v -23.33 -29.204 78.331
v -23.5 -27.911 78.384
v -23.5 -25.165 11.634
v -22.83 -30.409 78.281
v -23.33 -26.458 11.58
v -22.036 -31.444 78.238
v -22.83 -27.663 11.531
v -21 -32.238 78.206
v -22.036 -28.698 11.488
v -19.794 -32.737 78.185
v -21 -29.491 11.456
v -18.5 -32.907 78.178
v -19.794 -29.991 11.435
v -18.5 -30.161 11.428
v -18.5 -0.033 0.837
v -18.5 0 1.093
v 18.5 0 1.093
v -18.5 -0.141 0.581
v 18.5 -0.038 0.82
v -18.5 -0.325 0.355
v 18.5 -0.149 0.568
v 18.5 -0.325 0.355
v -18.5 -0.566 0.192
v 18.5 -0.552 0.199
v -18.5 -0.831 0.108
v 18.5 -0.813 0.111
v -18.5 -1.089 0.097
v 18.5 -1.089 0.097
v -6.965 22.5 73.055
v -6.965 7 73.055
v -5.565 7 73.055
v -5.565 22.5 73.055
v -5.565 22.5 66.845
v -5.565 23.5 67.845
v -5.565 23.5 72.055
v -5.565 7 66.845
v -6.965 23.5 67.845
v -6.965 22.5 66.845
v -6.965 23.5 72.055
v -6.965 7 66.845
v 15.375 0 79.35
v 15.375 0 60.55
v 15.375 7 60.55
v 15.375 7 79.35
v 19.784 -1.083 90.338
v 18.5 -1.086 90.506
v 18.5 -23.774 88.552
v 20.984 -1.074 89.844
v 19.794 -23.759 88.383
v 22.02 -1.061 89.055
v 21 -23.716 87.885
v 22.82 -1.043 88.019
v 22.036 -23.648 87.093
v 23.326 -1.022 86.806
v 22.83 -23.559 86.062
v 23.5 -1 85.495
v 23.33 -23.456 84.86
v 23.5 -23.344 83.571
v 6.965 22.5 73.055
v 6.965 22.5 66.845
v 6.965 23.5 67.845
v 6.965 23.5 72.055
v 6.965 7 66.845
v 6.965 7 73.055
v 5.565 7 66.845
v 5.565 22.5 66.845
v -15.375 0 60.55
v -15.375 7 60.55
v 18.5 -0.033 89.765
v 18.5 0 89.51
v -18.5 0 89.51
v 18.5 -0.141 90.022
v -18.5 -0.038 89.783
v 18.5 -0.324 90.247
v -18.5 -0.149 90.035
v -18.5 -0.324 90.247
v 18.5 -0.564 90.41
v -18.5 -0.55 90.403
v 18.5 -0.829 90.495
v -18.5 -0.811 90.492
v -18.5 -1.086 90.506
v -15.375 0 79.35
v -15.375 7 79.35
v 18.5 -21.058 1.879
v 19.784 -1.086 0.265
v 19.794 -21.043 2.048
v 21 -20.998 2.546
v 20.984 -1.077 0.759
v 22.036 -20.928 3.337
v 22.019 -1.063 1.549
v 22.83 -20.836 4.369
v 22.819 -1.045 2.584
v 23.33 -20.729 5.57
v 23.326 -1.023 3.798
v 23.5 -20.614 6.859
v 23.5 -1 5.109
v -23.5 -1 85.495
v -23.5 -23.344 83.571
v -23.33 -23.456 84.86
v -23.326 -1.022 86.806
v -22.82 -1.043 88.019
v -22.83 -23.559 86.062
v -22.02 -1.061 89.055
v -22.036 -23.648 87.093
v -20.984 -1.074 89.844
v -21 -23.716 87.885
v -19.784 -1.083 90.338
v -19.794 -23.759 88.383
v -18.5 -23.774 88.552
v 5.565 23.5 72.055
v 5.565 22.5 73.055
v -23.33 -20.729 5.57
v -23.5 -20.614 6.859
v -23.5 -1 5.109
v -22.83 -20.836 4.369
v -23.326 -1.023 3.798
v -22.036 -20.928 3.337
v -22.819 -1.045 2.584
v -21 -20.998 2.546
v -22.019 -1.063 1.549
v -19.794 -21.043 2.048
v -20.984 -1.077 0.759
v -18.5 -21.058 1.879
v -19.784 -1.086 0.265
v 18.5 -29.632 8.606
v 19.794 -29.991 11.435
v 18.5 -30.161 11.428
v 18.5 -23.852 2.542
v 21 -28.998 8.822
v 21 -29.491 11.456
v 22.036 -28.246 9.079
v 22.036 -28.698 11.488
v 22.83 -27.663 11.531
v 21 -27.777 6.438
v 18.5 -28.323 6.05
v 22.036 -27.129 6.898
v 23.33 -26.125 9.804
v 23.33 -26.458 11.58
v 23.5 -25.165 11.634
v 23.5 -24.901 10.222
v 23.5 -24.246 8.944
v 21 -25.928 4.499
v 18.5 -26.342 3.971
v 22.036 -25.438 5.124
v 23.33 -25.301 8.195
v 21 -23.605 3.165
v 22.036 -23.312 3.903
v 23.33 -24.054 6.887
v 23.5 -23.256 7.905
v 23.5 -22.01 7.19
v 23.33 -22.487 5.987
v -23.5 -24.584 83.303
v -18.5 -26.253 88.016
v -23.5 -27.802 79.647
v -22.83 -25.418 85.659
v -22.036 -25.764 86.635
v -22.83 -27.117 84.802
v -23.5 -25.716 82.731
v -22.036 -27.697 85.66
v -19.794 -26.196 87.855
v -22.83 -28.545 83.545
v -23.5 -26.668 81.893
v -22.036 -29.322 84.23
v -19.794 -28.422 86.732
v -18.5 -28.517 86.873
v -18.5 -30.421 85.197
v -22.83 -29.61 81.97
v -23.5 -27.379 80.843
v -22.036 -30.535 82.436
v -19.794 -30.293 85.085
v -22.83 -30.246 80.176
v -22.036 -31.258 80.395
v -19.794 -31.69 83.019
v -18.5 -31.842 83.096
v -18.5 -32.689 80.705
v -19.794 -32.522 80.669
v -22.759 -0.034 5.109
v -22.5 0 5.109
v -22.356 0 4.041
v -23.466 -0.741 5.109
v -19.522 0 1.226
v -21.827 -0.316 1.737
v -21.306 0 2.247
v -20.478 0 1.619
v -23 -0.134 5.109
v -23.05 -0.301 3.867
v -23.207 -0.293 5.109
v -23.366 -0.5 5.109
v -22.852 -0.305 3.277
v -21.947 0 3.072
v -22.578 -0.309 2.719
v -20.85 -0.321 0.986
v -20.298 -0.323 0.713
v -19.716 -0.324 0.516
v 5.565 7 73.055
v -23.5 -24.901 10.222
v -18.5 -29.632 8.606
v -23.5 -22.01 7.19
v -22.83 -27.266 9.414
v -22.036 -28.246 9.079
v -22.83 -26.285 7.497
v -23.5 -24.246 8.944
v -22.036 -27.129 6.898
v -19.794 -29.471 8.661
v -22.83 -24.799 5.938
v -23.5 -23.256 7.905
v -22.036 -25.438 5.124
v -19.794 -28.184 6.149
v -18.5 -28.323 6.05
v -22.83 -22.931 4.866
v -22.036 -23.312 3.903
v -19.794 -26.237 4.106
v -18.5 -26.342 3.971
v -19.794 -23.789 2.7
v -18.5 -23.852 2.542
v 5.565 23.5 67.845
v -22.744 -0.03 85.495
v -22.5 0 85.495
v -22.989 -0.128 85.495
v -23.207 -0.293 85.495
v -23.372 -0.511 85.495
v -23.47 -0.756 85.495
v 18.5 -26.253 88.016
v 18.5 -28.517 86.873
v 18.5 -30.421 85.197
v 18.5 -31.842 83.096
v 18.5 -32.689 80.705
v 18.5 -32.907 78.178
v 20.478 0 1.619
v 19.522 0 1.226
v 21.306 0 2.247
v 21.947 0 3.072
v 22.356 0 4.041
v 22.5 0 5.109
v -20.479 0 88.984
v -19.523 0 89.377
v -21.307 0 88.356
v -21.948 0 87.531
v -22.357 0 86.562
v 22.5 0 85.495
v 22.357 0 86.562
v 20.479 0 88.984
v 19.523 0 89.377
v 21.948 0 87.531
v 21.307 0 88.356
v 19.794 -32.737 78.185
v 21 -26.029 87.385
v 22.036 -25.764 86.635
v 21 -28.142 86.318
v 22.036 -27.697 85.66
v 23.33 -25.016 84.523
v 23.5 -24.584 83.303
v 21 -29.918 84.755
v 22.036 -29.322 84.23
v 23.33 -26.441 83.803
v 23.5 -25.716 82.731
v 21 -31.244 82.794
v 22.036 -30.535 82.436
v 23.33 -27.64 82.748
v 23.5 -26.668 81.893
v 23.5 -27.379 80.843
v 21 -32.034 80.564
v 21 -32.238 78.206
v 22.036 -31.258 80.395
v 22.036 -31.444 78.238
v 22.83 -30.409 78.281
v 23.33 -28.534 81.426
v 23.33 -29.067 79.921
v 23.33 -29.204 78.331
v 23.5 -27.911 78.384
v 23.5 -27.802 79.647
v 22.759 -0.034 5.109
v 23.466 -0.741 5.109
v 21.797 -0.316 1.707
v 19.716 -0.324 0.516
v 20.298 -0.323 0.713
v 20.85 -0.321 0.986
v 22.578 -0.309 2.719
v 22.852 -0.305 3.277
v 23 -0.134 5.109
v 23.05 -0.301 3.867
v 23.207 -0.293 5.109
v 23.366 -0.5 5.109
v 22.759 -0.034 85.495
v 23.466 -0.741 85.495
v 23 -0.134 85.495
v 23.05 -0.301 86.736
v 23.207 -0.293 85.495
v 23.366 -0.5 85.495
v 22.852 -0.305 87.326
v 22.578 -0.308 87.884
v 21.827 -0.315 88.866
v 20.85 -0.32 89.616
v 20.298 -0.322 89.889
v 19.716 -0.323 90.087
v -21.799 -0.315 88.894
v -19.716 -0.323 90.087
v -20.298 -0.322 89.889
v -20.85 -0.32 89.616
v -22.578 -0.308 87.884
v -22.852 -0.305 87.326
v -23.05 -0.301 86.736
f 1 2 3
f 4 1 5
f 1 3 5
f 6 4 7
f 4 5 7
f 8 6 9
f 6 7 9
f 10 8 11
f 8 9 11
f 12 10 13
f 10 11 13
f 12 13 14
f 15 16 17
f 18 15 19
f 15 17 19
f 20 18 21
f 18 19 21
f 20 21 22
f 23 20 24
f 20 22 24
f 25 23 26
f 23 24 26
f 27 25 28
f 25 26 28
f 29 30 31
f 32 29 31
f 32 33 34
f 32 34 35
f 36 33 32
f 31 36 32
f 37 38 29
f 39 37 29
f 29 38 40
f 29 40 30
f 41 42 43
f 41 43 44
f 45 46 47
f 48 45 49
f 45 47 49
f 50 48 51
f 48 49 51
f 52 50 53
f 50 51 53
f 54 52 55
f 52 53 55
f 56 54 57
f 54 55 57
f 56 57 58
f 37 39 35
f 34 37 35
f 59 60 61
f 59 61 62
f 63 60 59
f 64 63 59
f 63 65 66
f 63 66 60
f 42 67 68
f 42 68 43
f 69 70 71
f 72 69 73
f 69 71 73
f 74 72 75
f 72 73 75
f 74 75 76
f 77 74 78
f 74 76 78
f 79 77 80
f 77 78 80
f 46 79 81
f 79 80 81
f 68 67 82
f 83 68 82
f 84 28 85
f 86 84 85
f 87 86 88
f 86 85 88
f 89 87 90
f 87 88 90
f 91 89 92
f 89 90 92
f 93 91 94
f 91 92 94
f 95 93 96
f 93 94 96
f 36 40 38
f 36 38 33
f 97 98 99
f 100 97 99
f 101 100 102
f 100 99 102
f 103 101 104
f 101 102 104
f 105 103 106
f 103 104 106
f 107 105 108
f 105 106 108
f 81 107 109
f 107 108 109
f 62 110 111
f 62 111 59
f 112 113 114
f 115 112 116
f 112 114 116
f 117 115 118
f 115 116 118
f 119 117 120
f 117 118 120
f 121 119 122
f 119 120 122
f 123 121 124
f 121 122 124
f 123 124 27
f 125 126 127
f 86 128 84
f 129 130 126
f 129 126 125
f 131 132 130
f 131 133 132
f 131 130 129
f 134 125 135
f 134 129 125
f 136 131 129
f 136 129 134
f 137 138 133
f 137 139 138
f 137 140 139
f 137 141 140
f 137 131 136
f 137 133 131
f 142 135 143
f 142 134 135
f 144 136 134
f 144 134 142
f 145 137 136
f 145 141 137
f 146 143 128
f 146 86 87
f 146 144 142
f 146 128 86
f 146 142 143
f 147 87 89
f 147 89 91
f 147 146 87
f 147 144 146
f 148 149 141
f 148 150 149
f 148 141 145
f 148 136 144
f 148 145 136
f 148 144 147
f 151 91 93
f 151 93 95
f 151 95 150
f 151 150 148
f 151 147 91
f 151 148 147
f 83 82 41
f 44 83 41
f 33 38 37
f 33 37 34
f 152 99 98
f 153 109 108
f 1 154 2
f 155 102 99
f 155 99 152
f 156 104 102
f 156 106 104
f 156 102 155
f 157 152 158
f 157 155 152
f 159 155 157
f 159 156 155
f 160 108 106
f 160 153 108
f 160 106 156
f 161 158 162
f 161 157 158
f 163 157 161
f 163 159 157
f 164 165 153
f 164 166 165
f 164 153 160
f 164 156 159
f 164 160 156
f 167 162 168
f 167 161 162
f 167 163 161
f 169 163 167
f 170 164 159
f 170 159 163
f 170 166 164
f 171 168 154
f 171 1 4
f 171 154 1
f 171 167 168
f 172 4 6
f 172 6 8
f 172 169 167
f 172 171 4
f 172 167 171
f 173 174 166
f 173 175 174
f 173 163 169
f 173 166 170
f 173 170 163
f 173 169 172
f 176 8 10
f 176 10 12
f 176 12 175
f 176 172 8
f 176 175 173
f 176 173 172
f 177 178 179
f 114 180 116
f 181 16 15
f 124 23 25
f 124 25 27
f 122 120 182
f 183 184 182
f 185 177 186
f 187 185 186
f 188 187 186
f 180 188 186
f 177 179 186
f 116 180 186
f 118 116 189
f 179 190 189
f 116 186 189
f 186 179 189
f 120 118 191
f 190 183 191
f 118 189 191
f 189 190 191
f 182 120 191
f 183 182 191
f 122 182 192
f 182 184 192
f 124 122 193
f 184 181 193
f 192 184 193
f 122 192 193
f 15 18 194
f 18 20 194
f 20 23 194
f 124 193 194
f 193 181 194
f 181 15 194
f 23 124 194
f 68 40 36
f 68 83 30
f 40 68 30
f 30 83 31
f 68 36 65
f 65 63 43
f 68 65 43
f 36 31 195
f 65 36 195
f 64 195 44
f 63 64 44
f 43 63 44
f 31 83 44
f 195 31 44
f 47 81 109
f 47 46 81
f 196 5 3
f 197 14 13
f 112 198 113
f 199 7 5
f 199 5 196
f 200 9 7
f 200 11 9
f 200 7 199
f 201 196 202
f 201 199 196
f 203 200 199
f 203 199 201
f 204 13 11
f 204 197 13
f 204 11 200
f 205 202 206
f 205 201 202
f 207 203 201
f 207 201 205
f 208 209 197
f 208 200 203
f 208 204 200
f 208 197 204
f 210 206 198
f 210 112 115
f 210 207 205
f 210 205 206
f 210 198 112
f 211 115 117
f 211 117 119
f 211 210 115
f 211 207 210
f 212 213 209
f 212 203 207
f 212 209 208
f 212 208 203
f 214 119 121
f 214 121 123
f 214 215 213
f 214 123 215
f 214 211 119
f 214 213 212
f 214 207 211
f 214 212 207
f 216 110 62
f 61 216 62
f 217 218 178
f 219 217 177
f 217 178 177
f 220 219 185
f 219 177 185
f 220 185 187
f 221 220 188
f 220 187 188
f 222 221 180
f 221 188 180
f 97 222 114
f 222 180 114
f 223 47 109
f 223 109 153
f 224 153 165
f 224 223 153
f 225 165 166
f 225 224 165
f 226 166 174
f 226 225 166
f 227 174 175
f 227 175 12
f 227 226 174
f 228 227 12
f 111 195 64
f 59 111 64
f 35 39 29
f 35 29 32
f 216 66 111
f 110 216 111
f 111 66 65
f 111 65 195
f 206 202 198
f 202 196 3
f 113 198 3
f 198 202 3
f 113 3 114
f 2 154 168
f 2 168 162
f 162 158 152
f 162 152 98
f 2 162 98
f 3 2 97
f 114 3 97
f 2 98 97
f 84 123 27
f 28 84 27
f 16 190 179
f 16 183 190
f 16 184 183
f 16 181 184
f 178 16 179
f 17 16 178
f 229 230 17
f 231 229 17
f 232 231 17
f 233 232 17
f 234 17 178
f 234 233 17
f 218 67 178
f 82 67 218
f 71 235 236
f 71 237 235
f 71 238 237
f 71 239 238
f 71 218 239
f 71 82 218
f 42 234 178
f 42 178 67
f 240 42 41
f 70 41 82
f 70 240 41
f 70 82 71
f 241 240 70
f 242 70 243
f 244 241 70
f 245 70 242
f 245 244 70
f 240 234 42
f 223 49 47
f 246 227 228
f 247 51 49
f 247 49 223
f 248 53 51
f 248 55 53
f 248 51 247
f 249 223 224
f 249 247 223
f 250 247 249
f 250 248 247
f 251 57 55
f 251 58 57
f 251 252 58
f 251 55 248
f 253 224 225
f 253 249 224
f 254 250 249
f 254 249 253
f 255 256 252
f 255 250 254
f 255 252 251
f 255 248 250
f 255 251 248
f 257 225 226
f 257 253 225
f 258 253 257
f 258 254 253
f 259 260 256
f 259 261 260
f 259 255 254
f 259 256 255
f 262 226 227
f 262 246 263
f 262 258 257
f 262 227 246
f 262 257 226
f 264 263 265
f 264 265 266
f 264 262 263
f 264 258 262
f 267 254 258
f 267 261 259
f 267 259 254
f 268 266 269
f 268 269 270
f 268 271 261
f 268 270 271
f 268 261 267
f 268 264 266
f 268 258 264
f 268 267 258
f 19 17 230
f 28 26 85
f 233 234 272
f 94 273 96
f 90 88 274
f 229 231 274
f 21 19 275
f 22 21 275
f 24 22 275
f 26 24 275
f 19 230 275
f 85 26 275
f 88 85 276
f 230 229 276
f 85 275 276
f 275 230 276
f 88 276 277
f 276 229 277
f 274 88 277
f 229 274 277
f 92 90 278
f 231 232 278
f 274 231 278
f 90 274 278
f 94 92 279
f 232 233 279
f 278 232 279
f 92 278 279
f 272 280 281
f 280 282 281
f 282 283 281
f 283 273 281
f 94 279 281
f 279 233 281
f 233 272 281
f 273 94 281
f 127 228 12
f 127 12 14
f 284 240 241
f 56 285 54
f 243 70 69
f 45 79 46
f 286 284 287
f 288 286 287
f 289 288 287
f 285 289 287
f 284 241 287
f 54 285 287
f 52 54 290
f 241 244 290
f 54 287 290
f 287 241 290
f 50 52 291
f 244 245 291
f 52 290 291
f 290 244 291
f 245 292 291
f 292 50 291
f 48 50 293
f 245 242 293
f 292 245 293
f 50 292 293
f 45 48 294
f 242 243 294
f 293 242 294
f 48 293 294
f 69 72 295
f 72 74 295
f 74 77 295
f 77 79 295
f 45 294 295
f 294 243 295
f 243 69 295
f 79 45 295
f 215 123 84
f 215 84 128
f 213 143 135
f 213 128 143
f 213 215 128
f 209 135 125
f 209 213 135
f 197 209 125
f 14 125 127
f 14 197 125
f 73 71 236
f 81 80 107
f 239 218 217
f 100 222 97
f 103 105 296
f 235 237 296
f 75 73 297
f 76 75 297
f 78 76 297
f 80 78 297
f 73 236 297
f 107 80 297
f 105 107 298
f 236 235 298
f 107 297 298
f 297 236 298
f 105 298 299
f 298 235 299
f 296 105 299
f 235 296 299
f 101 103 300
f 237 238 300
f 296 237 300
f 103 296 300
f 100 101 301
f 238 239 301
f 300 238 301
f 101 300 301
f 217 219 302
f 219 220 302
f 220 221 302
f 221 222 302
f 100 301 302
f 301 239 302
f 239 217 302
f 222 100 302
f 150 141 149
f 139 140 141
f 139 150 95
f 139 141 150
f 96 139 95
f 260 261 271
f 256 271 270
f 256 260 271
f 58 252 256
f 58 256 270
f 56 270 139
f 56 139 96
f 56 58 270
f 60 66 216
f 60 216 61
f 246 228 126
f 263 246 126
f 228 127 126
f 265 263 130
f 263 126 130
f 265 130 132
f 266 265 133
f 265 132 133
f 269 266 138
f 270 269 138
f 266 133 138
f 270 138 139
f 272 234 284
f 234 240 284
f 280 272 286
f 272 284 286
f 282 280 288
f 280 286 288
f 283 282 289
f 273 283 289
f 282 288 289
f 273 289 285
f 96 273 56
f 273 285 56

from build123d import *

# Parameters (mm, degrees)
F1_DEPTH = 23.5
F2_W     = 30.75
F2_H     = 18.8
F2_W_2   = 1.4
F2_H_2   = 6.21
F3_DEPTH = 7
F4_DEPTH = 23.5
F5_R     = 10
F6_R     = 5
F7_R     = 1
F8_SIZE  = 1


with BuildPart() as f1:
    # F0 (on Right) → F1 (new body, symmetric)
    with BuildSketch(Plane.YZ):
        Polygon((0, 0), (0, 90.6), (-33.3, 87.7318647873), (-29.8, 2.658541554), align=None)
    extrude(amount=F1_DEPTH, both=True)

    # F2 (on Front) → F3 (join)
    with BuildSketch(Plane.XZ):
        with Locations((0, 69.95)):
            Rectangle(F2_W, F2_H)
        with Locations((-6.265, 69.95)):
            Rectangle(F2_W_2, F2_H_2, mode=Mode.SUBTRACT)
        with Locations((6.265, 69.95)):
            Rectangle(F2_W_2, F2_H_2, mode=Mode.SUBTRACT)
        with Locations((6.265, 69.95)):
            Rectangle(F2_W_2, F2_H_2)
        with Locations((-6.265, 69.95)):
            Rectangle(F2_W_2, F2_H_2)
    extrude(amount=-F3_DEPTH)

    # F2 (on Front) → F4 (join)
    with BuildSketch(Plane.XZ):
        with Locations((-6.265, 69.95)):
            Rectangle(F2_W_2, F2_H_2)
        with Locations((6.265, 69.95)):
            Rectangle(F2_W_2, F2_H_2)
    extrude(amount=-F4_DEPTH)

    # F5
    f5_edges = [f1.edges().sort_by_distance(p)[0] for p in [
        (0, -33.3, 87.731865),
        (0, -29.8, 2.658542),
    ]]
    fillet(f5_edges, radius=F5_R)

    # F6
    f6_edges = [f1.edges().sort_by_distance(p)[0] for p in [
        (23.5, -31.533869, 44.803107),
        (-23.5, -31.533869, 44.803107),
    ]]
    fillet(f6_edges, radius=F6_R)

    # F7
    f7_edges = [f1.edges().sort_by_distance(p)[0] for p in [
        (23.5, 0, 45.300673),
    ]]
    fillet(f7_edges, radius=F7_R)

    # F8
    f8_edges = [f1.edges().sort_by_distance(p)[0] for p in [
        (-6.265, 23.5, 73.055),
        (-6.265, 23.5, 66.845),
        (6.265, 23.5, 73.055),
        (6.265, 23.5, 66.845),
    ]]
    chamfer(f8_edges, length=F8_SIZE)


solid = f1.part
